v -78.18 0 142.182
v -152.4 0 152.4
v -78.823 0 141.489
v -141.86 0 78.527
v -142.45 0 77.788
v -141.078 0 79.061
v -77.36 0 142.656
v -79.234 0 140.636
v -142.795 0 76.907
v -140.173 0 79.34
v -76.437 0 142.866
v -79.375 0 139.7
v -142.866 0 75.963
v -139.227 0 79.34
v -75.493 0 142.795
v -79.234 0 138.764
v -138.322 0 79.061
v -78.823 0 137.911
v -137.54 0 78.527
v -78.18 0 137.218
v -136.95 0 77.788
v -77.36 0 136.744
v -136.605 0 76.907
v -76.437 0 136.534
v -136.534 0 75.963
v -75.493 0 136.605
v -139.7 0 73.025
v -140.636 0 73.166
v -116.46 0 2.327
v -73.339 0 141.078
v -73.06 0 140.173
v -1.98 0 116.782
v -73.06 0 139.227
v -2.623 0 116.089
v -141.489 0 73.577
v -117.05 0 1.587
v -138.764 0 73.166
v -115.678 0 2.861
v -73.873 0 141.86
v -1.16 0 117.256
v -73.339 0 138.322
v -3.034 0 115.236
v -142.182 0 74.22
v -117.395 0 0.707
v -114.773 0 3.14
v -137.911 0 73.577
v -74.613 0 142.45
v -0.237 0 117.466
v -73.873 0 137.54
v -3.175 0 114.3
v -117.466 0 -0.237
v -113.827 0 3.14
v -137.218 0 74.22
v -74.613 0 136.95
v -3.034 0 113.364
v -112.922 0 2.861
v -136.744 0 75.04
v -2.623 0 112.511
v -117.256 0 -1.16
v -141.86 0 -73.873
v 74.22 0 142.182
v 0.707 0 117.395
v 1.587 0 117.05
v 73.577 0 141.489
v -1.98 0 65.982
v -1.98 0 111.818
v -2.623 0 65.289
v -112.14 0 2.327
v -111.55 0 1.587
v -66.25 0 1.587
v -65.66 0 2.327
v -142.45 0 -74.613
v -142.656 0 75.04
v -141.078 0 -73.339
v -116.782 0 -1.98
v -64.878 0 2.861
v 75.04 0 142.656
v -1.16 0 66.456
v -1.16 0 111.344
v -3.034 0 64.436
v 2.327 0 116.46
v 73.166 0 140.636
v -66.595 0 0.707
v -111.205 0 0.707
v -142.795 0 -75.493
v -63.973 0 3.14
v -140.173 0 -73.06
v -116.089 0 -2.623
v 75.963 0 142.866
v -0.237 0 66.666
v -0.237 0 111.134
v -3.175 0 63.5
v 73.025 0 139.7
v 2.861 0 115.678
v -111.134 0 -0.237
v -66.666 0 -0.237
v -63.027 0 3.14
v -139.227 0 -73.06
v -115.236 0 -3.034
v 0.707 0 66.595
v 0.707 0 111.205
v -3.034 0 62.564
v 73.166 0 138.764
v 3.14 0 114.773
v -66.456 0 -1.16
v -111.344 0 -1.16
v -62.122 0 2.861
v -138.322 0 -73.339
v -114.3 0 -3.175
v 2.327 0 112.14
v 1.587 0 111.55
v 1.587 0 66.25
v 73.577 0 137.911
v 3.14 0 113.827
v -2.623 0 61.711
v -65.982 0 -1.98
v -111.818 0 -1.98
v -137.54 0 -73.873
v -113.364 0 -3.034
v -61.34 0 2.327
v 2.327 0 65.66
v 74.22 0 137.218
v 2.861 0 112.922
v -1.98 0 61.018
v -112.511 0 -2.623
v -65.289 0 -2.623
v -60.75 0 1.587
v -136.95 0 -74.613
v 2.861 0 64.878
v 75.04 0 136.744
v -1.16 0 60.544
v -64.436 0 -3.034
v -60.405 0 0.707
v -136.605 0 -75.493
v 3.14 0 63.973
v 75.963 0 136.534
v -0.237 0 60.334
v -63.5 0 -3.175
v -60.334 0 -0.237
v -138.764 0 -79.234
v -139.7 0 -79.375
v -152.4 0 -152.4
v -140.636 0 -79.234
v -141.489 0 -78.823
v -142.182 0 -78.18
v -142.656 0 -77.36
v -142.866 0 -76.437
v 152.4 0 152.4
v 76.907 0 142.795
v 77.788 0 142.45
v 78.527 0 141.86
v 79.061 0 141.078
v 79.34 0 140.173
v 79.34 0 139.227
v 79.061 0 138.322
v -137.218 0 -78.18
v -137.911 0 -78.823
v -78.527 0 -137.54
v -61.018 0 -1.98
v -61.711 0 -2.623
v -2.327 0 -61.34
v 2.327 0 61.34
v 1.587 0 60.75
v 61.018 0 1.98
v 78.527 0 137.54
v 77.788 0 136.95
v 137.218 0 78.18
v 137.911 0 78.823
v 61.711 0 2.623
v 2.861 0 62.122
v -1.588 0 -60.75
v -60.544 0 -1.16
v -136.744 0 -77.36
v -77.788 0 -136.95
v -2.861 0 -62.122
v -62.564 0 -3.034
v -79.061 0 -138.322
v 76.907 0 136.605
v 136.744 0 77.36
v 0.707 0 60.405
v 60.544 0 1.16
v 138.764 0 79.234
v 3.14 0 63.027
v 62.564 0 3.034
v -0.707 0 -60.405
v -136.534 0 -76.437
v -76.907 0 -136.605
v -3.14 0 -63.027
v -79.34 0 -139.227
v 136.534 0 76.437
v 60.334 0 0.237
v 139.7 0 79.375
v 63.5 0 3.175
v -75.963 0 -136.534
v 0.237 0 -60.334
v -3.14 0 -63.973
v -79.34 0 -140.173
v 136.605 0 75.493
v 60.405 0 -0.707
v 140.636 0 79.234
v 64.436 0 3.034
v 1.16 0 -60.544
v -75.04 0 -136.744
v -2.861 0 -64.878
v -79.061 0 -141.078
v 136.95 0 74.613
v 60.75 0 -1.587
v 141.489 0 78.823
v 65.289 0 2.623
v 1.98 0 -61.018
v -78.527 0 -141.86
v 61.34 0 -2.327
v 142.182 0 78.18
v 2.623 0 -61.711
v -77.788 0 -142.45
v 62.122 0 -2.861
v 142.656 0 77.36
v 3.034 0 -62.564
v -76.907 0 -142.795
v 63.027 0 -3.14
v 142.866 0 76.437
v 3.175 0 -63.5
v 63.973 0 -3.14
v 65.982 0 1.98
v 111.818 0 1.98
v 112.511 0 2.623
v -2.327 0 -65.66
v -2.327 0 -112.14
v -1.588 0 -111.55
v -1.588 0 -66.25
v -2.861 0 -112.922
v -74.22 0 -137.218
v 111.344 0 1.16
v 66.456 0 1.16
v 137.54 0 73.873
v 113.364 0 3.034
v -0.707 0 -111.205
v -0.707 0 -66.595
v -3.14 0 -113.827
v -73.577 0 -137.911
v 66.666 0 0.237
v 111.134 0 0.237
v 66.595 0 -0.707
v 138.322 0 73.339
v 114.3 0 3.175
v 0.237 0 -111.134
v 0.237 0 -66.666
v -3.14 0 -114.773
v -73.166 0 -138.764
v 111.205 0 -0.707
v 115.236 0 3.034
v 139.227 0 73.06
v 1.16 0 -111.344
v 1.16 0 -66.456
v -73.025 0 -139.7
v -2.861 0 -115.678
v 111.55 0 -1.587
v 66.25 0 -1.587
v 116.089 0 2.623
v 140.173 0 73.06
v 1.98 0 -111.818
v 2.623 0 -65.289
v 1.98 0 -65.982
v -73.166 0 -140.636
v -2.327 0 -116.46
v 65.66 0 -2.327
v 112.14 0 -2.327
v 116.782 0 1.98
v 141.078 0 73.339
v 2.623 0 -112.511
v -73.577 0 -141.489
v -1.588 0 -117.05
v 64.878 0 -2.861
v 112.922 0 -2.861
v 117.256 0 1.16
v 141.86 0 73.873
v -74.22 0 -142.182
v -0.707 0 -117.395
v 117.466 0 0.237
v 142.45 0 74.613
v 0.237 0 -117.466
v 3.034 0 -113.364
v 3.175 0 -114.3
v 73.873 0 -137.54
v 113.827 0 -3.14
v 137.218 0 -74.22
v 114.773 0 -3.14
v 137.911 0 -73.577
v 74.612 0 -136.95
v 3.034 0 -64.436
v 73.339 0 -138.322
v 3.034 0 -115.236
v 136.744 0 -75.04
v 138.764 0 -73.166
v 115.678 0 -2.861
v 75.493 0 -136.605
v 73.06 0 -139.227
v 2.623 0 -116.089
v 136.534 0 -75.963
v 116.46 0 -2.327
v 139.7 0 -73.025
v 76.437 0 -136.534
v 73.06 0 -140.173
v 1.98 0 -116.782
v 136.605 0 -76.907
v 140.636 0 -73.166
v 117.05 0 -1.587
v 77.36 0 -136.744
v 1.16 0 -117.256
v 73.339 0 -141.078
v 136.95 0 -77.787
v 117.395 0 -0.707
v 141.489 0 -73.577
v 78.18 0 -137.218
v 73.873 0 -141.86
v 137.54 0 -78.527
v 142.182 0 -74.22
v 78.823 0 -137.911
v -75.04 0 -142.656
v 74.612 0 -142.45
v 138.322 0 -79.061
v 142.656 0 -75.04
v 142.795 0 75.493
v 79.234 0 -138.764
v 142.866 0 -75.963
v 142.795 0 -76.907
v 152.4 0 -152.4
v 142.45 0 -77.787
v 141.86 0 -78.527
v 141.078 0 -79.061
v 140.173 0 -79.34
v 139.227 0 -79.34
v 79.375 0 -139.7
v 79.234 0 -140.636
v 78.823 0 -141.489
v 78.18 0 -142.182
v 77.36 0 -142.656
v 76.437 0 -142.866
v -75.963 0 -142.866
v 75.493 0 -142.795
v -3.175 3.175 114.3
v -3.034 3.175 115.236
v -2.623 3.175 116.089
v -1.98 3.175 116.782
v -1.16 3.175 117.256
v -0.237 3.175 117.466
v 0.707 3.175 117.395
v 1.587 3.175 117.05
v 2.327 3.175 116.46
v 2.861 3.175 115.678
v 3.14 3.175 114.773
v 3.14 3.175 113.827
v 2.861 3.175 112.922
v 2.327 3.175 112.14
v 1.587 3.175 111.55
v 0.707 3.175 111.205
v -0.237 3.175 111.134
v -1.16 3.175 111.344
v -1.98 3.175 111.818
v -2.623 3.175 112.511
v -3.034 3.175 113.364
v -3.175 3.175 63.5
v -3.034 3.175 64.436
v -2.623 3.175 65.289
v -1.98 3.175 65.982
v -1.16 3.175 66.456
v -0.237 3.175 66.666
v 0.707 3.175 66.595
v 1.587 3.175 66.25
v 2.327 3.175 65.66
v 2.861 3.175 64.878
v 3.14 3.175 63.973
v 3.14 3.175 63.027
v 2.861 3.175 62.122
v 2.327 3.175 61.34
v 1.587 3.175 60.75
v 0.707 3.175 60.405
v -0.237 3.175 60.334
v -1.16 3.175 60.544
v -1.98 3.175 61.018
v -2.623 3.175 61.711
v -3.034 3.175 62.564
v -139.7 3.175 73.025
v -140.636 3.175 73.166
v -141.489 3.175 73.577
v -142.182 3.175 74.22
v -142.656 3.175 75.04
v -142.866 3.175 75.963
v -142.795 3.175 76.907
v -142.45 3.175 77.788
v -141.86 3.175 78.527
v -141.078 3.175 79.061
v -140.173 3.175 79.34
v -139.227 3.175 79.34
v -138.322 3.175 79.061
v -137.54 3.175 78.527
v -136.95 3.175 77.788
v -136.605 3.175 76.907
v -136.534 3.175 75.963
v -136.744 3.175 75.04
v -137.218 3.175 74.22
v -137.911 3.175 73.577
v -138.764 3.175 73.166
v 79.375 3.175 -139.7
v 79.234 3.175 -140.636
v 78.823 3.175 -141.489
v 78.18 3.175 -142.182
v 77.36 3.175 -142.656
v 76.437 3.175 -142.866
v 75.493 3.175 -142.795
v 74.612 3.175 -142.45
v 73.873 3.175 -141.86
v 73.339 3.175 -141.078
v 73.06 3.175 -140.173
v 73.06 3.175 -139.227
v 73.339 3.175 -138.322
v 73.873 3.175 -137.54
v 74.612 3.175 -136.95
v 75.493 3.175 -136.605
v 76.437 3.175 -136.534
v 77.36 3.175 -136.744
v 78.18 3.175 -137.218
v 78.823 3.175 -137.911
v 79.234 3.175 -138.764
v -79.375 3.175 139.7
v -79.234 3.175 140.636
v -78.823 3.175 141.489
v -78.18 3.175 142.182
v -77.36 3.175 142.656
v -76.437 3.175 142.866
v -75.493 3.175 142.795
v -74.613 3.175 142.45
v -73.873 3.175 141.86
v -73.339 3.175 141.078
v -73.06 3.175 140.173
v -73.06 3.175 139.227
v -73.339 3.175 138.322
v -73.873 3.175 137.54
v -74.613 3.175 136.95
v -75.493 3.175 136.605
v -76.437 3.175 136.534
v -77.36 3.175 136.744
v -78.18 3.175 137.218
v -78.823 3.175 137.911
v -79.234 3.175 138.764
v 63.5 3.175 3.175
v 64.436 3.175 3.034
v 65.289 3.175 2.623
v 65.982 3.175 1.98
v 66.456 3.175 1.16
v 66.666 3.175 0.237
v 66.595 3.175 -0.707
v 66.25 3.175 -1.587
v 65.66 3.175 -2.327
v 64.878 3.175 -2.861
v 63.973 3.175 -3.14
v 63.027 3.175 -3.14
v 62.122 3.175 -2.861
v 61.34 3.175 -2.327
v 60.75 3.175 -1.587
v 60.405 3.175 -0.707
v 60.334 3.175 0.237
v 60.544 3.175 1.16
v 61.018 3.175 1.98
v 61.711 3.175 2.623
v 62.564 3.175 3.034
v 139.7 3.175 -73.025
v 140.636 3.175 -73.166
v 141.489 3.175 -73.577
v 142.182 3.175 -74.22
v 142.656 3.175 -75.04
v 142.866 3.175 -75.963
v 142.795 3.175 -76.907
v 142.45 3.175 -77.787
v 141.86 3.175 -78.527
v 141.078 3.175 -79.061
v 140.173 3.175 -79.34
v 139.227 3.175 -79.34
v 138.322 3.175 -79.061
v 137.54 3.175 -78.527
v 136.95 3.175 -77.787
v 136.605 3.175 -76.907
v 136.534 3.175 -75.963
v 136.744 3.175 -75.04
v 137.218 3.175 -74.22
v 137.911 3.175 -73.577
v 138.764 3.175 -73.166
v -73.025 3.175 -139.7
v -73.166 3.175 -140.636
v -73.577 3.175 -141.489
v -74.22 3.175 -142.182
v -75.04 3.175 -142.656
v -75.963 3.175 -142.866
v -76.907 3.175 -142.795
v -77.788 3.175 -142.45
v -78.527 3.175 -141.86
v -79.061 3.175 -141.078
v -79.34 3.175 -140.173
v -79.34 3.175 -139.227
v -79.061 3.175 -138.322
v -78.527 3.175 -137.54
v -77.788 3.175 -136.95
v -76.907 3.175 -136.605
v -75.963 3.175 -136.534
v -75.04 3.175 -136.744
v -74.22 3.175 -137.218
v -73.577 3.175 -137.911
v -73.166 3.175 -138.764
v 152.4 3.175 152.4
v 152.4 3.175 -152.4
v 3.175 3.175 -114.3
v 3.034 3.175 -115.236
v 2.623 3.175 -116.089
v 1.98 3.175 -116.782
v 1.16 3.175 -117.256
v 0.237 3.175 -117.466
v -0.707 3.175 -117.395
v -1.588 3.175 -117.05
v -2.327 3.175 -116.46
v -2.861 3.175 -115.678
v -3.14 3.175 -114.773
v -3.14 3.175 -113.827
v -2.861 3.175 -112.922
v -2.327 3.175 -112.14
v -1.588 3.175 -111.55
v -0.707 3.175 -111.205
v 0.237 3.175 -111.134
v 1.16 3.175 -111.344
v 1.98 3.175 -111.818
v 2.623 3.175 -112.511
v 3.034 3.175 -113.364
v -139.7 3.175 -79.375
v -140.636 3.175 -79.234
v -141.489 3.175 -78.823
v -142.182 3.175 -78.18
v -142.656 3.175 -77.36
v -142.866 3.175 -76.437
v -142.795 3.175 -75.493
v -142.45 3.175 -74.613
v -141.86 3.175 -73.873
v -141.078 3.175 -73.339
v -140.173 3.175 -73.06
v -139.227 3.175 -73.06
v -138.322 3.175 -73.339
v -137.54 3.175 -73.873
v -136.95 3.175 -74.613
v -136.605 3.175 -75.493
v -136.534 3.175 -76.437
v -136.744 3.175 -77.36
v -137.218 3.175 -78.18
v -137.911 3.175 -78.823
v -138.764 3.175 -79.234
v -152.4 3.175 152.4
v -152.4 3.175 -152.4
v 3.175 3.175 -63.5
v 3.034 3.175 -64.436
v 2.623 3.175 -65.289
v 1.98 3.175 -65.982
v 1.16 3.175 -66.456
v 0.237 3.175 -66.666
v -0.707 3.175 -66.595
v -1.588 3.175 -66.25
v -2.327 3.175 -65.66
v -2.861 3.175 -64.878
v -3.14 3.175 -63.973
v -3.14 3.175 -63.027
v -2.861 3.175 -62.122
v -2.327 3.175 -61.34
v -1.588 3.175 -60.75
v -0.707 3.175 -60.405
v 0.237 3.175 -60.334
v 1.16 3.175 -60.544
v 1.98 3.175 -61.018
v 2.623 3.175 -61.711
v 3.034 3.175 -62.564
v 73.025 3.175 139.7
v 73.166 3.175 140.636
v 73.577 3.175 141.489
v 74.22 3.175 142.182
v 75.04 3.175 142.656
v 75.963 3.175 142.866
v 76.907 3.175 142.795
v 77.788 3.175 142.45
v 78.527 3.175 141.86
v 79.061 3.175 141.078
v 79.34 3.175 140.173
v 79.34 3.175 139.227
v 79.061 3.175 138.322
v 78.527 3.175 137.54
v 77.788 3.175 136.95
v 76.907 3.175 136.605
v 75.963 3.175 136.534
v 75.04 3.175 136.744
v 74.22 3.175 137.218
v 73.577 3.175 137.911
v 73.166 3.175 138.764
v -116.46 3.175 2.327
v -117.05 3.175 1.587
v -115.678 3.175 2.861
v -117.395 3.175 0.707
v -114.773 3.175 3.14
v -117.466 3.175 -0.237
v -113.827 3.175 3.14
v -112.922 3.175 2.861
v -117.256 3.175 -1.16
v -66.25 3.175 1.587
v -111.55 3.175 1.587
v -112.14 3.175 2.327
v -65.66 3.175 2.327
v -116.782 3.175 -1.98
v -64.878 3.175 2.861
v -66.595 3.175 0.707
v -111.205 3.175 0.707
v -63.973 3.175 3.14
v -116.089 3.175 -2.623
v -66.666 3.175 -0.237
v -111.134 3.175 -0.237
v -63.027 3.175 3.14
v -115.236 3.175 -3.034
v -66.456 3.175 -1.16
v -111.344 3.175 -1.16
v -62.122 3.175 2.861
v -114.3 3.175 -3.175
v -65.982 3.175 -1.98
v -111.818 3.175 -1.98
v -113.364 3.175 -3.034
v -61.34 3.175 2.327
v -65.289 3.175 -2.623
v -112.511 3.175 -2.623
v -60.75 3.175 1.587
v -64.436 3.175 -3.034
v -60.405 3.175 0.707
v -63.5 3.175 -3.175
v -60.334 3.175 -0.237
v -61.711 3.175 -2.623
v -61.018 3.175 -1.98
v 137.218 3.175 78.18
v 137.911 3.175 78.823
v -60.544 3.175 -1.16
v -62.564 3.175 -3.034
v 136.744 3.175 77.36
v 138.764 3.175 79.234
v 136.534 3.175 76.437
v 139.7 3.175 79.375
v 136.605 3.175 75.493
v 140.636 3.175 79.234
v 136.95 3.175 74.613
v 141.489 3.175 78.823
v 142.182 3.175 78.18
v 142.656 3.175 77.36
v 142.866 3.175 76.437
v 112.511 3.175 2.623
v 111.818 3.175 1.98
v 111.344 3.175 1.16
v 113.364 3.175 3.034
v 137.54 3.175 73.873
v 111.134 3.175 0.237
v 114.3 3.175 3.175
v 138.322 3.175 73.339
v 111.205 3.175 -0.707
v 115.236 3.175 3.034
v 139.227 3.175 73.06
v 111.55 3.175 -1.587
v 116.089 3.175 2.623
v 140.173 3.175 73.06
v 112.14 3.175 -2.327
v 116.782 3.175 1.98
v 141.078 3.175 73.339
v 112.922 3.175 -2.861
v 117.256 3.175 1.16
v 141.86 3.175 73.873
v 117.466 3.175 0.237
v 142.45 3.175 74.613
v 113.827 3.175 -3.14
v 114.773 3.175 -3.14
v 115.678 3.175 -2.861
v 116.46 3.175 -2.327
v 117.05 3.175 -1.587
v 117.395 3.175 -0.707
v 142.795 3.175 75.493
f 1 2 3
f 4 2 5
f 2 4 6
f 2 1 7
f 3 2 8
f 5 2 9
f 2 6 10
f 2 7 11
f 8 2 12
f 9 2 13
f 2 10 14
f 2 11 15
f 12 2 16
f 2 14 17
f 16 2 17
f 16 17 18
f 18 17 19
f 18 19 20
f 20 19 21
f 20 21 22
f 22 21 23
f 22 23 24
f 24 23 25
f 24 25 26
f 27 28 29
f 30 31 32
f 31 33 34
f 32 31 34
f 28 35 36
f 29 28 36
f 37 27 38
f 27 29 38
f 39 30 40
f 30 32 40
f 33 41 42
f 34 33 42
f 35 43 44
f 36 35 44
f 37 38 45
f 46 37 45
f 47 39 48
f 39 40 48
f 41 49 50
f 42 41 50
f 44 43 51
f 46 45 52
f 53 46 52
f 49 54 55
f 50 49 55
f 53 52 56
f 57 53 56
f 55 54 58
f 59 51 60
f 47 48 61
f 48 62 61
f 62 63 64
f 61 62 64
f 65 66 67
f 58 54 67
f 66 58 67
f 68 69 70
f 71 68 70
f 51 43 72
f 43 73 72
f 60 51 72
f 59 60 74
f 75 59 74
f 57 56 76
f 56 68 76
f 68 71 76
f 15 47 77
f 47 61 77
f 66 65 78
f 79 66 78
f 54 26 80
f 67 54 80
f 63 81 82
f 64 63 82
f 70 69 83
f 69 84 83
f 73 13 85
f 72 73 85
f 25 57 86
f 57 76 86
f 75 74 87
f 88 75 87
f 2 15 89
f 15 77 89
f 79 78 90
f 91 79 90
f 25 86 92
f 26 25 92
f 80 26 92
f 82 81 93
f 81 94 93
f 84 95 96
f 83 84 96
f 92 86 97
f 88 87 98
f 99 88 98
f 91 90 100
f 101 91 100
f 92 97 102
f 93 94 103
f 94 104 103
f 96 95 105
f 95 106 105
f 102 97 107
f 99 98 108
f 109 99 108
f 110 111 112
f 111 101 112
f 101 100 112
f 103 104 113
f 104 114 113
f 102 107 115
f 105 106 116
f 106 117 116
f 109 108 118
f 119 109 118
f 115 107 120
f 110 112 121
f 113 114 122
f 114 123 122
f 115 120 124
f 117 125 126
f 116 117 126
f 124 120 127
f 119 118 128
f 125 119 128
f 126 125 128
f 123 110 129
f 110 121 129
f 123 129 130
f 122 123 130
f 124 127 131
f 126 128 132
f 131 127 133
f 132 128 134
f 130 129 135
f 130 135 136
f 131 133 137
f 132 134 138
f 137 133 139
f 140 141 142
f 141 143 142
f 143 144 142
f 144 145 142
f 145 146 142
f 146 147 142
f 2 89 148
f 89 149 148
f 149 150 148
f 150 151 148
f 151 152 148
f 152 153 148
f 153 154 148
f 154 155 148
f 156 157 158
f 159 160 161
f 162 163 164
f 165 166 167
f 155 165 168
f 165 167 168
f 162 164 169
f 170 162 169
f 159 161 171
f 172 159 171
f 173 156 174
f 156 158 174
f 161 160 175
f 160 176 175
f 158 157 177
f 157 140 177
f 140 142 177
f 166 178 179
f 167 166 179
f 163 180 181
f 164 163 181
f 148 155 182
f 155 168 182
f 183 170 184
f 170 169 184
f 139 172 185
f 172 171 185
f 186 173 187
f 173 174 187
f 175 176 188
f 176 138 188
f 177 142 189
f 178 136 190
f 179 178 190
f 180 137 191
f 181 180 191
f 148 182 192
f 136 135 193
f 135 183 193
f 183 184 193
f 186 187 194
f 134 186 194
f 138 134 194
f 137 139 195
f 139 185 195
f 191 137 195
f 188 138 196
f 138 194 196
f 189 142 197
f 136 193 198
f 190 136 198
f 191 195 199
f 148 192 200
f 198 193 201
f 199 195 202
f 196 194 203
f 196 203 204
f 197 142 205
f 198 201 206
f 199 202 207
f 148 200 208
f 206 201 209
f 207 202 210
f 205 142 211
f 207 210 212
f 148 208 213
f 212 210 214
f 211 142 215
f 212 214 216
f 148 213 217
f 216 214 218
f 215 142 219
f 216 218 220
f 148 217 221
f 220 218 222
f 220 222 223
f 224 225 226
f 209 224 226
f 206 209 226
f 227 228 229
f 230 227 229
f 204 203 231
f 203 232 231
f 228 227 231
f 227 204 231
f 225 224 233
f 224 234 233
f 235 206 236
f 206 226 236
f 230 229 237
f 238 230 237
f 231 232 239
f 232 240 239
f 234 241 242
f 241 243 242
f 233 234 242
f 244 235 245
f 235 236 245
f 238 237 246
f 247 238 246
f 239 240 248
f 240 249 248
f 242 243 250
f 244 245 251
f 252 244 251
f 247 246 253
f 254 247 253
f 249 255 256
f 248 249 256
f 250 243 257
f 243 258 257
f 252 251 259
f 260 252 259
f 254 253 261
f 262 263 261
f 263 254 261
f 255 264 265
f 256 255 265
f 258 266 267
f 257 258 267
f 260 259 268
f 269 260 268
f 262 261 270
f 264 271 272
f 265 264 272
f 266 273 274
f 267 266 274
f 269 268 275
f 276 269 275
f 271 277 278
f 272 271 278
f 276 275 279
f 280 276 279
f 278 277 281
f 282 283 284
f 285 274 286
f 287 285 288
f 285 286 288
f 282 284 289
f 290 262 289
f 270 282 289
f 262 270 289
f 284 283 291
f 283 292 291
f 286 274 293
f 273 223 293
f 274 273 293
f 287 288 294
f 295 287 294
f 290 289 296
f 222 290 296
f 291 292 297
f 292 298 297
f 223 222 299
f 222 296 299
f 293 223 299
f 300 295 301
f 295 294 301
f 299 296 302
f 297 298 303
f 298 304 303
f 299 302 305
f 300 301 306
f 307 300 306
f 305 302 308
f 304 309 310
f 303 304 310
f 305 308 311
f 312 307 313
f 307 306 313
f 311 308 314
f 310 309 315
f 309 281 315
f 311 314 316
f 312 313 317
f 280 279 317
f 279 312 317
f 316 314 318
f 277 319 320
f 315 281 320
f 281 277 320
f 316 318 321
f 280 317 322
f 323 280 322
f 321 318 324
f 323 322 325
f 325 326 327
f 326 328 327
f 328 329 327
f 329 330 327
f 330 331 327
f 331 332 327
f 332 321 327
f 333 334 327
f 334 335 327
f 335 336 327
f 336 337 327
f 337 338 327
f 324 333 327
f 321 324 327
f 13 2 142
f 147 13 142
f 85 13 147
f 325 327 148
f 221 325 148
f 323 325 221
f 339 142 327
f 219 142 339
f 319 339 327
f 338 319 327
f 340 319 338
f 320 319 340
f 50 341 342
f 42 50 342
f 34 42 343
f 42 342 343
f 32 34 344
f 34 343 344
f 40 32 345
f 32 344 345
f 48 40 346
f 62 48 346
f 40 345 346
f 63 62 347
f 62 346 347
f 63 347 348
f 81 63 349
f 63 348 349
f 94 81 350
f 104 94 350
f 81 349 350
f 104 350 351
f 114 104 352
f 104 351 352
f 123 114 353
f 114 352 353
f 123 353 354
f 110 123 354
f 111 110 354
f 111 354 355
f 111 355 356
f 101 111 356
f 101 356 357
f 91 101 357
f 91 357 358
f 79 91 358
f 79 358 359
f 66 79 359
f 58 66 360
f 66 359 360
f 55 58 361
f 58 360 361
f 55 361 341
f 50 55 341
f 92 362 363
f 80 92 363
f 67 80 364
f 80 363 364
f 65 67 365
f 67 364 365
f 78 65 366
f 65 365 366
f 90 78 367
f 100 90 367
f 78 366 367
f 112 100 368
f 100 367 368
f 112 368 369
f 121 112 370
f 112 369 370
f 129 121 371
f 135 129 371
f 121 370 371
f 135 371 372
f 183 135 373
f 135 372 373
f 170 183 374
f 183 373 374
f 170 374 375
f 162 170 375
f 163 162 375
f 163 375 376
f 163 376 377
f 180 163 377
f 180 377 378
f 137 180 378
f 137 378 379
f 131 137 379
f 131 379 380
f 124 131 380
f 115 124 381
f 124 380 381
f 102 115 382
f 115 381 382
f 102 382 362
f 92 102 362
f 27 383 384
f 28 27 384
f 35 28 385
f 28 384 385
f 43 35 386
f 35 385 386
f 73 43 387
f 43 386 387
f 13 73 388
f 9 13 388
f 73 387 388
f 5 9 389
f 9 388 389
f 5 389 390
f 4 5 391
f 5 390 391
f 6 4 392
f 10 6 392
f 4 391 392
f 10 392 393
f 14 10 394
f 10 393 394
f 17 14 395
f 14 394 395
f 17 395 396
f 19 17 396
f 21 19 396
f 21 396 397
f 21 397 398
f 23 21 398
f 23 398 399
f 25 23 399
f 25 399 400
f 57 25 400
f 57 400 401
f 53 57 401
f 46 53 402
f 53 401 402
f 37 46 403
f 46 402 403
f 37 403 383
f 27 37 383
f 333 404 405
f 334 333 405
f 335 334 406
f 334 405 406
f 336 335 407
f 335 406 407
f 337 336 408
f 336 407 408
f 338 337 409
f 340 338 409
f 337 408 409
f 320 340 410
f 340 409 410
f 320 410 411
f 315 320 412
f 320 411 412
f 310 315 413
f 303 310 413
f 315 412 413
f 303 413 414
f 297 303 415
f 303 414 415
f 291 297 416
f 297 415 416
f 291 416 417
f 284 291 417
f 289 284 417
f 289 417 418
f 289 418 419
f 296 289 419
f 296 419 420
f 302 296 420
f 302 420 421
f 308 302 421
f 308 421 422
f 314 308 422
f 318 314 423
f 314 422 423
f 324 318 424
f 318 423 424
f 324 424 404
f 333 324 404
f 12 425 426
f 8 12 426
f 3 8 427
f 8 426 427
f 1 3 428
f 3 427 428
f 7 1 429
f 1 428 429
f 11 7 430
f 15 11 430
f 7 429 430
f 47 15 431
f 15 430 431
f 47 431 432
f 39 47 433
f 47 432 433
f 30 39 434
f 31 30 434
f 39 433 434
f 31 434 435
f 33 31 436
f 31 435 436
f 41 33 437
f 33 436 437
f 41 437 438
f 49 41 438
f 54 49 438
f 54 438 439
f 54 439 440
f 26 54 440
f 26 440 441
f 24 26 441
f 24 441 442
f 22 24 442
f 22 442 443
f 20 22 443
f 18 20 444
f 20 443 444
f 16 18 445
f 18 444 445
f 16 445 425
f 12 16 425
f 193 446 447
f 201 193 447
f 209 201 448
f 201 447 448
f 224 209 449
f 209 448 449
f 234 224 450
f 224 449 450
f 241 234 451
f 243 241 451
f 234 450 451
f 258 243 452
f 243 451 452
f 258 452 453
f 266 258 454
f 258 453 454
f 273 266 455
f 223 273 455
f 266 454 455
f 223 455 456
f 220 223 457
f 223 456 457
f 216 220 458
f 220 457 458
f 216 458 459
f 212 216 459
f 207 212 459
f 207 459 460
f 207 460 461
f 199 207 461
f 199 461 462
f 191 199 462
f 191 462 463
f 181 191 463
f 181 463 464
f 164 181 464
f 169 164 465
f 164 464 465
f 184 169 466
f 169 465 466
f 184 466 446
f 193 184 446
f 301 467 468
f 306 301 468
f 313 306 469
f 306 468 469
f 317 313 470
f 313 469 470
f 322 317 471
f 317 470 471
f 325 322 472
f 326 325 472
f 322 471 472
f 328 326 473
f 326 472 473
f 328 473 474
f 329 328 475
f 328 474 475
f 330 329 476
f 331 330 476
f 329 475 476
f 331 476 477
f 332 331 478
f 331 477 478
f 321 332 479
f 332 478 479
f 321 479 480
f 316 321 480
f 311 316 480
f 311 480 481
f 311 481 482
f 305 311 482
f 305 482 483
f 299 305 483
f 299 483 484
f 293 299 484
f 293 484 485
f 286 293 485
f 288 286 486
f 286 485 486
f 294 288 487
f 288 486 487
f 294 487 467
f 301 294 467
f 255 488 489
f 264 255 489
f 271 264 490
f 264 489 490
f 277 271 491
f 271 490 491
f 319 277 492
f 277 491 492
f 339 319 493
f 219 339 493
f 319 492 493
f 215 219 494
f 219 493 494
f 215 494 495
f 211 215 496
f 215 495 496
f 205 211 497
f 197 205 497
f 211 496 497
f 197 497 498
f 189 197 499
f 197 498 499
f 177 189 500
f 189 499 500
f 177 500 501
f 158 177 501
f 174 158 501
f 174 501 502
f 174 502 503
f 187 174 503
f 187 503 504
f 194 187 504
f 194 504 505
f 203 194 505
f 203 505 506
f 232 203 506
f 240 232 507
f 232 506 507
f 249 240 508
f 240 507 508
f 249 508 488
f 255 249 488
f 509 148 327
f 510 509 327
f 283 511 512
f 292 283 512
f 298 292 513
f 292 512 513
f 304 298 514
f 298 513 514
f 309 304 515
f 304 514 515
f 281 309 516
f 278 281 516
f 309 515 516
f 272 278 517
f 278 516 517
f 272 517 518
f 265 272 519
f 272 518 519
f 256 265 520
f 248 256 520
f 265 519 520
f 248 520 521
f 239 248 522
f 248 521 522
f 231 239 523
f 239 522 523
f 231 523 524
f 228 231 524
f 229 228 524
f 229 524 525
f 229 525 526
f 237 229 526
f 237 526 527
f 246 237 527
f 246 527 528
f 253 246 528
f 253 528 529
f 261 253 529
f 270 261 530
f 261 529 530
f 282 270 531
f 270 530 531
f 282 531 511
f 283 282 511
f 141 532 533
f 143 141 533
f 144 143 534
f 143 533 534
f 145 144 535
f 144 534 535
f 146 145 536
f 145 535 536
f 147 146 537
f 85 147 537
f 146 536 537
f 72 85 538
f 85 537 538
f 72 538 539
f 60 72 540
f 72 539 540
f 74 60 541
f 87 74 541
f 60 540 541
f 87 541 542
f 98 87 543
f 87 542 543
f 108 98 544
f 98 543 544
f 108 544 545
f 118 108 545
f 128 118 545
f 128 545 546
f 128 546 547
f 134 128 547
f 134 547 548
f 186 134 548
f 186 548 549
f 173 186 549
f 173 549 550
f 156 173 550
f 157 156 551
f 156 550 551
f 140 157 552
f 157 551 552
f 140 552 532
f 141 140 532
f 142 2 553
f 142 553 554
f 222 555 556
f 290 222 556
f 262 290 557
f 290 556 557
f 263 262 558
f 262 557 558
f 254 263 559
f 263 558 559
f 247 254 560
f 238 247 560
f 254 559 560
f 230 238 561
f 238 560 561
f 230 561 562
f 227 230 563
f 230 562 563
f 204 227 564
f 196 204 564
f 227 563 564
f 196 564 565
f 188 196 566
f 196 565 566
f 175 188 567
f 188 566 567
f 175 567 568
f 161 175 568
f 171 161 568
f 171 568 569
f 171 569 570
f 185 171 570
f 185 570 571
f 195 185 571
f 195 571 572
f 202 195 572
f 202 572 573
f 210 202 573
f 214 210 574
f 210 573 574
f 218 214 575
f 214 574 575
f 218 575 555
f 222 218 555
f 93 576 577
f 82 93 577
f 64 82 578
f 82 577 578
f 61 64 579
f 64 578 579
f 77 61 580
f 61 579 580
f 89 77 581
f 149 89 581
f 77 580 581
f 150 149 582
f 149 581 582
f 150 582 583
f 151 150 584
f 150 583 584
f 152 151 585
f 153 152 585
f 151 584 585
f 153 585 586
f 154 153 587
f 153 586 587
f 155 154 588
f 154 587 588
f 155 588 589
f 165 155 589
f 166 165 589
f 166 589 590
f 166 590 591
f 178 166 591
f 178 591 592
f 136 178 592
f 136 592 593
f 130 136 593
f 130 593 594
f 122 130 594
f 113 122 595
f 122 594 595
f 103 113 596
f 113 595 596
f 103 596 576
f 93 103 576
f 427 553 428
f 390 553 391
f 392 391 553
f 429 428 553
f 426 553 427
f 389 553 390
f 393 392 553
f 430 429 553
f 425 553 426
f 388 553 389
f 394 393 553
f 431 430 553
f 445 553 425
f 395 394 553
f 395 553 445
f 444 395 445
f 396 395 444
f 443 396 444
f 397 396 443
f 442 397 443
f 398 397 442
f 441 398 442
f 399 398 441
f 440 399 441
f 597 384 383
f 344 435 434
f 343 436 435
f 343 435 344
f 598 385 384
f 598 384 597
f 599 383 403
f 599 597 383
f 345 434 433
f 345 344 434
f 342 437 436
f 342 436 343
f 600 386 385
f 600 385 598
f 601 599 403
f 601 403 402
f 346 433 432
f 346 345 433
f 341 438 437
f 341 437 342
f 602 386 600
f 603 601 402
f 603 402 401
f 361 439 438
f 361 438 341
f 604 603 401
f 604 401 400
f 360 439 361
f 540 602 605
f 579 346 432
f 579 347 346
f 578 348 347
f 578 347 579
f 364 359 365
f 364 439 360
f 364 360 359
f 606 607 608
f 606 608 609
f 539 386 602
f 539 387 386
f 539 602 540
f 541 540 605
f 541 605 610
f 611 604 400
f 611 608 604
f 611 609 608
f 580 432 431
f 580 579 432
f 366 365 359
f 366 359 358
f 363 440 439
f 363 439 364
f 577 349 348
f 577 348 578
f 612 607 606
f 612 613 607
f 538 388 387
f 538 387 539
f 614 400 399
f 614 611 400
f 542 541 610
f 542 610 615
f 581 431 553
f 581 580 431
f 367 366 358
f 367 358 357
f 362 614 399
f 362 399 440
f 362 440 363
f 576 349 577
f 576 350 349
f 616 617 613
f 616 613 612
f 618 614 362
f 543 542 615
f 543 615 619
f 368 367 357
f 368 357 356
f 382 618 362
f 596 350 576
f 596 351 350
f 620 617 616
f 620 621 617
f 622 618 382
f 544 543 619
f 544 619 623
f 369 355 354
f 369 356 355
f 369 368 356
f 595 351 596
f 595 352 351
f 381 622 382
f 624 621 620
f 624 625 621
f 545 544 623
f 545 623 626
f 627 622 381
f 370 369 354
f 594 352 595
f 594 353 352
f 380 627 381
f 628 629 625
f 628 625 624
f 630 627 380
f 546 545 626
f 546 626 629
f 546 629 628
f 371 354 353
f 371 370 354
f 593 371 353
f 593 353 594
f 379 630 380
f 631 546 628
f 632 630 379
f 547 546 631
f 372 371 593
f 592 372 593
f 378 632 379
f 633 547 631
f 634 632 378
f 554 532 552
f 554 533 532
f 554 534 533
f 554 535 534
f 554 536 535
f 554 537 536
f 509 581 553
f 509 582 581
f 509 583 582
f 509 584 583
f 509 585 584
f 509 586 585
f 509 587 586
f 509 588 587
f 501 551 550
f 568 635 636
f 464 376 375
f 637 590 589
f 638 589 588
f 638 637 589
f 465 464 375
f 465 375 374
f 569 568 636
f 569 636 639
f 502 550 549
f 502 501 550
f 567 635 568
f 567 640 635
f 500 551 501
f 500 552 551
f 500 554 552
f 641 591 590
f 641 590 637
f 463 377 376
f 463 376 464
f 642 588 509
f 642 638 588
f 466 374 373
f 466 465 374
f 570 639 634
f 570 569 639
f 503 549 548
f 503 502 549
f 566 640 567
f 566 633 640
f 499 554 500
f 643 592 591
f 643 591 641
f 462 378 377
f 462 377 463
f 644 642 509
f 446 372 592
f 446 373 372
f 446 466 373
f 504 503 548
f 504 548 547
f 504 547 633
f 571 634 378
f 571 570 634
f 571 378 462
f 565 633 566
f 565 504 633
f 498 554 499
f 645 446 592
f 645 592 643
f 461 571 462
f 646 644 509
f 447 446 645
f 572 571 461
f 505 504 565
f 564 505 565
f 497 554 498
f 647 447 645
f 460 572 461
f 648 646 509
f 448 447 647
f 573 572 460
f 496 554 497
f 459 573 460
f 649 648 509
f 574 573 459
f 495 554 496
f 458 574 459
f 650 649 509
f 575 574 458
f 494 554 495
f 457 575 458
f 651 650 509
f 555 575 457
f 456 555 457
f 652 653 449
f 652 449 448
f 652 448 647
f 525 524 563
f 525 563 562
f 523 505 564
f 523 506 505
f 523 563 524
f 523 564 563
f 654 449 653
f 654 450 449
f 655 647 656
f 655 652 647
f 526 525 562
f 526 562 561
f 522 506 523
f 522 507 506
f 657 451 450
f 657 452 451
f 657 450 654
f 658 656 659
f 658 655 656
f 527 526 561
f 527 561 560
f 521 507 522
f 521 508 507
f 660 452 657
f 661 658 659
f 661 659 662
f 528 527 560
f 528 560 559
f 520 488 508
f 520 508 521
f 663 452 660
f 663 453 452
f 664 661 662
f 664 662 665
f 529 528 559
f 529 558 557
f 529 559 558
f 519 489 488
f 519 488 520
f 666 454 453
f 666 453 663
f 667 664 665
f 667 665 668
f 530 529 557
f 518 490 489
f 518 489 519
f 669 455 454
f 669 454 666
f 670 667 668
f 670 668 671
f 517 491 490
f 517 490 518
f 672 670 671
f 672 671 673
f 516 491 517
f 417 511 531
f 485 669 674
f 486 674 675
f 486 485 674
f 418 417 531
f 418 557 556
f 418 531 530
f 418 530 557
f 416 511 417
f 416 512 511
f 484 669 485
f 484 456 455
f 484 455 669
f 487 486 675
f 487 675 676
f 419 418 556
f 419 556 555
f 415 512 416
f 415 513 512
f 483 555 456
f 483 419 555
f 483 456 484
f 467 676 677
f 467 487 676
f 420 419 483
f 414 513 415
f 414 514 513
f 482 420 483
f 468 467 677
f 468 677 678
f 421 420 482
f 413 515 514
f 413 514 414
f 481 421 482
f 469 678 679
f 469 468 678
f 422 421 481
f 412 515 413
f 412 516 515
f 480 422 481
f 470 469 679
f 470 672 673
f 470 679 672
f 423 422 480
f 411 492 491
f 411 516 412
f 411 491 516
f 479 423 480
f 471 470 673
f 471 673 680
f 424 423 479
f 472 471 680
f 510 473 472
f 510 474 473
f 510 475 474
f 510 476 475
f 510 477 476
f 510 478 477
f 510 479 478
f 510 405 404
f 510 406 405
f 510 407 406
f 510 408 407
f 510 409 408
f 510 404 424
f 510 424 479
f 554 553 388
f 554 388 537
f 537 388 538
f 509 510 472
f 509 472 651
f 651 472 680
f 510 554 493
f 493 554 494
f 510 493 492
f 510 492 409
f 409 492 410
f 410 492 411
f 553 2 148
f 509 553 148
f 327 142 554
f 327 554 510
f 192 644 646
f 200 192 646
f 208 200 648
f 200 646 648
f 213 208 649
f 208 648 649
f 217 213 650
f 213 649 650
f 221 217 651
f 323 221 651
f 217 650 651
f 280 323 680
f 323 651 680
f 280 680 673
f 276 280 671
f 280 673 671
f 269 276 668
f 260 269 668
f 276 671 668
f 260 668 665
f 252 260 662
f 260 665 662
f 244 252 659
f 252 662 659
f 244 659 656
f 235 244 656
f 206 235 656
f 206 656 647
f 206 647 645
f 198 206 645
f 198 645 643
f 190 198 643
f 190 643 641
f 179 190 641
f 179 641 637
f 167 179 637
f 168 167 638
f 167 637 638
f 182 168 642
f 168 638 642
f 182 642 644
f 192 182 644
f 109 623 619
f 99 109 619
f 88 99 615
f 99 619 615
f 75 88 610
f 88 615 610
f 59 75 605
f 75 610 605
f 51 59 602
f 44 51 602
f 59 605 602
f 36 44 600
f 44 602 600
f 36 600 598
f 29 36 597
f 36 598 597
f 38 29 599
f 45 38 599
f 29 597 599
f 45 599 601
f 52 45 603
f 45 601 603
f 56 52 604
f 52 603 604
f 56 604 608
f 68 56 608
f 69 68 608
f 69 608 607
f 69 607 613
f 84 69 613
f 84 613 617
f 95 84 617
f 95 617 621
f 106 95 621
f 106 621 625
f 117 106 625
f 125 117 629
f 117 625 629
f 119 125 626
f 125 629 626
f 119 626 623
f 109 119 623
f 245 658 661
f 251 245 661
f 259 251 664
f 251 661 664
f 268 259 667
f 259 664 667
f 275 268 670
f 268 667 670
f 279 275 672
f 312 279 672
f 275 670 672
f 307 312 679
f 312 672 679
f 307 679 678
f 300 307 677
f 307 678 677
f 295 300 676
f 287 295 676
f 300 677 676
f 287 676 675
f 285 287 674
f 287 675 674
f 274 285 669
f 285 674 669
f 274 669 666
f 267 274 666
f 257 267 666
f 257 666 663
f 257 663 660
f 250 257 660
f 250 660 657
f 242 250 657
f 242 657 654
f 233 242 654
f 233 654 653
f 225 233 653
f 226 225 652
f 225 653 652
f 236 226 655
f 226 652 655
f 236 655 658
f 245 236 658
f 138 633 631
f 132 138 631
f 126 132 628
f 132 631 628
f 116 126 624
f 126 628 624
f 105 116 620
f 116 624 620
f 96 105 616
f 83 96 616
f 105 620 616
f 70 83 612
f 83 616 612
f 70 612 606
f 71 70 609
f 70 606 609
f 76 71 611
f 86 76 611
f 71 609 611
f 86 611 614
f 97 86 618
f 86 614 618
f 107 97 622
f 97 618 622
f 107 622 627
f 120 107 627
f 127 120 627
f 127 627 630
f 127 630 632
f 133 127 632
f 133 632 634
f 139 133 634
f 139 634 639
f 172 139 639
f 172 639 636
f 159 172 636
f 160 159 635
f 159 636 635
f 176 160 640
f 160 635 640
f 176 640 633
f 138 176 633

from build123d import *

# Parameters (mm, degrees)
SKETCH1_W           = 304.8
SKETCH1_H           = 304.8
BOSS_EXTRUDE1_DEPTH = 3.175
CUT_EXTRUDE1_REACH  = 217.55
SKETCH2_R           = 3.175
CIRPATTERN1_COUNT   = 4
CUT_EXTRUDE2_REACH  = 217.55
SKETCH4_R           = 3.175
CIRPATTERN2_COUNT   = 4


with BuildPart() as part:
    # Sketch1 → Boss-Extrude1 (new body)
    with BuildSketch(Plane(origin=(0, 0, 0), x_dir=(1, 0, 0), z_dir=(0, 1, 0))):
        Rectangle(SKETCH1_W, SKETCH1_H)
    extrude(amount=BOSS_EXTRUDE1_DEPTH)

    # Sketch2 → Cut-Extrude1 (cut, up to next)
    with BuildSketch(Plane(origin=(0, 3.175, 0), x_dir=(1, 0, 0), z_dir=(0, 1, 0)), mode=Mode.PRIVATE) as cut_extrude1_sk1:
        with Locations((0, 114.3)):
            Circle(SKETCH2_R)
    cut_extrude1_tool1 = extrude(cut_extrude1_sk1.sketch, amount=-CUT_EXTRUDE1_REACH, mode=Mode.PRIVATE) & part.part
    # Sketch2 → Cut-Extrude1 (cut, up to next)
    with BuildSketch(Plane(origin=(0, 3.175, 0), x_dir=(1, 0, 0), z_dir=(0, 1, 0)), mode=Mode.PRIVATE) as cut_extrude1_sk2:
        with Locations((0, 63.5)):
            Circle(SKETCH2_R)
    cut_extrude1_tool2 = extrude(cut_extrude1_sk2.sketch, amount=-CUT_EXTRUDE1_REACH, mode=Mode.PRIVATE) & part.part
    cut_extrude1_1 = cut_extrude1_tool1.solids().sort_by_distance((0, 3.175, -114.3))[0]
    add(cut_extrude1_1, mode=Mode.SUBTRACT)
    cut_extrude1_2 = cut_extrude1_tool2.solids().sort_by_distance((0, 3.175, -63.5))[0]
    add(cut_extrude1_2, mode=Mode.SUBTRACT)
    cut_extrude1 = cut_extrude1_1 + cut_extrude1_2  # Cut-Extrude1 as one shape, for the pattern or mirror that repeats it

    # CirPattern1: Cut-Extrude1 ×4 about axis
    cirpattern1_axis = Axis((0, 3.175, 0), (0, 1, 0))
    for i in range(1, CIRPATTERN1_COUNT):
        add(cut_extrude1.rotate(cirpattern1_axis, i * 360 / CIRPATTERN1_COUNT), mode=Mode.SUBTRACT)

    # Sketch4 → Cut-Extrude2 (cut, up to next)
    with BuildSketch(Plane(origin=(0, 3.175, 0), x_dir=(1, 0, 0), z_dir=(0, 1, 0)), mode=Mode.PRIVATE) as cut_extrude2_sk1:
        with Locations((-76.2, 139.7)):
            Circle(SKETCH4_R)
    cut_extrude2_tool1 = extrude(cut_extrude2_sk1.sketch, amount=-CUT_EXTRUDE2_REACH, mode=Mode.PRIVATE) & part.part
    # Sketch4 → Cut-Extrude2 (cut, up to next)
    with BuildSketch(Plane(origin=(0, 3.175, 0), x_dir=(1, 0, 0), z_dir=(0, 1, 0)), mode=Mode.PRIVATE) as cut_extrude2_sk2:
        with Locations((76.2, 139.7)):
            Circle(SKETCH4_R)
    cut_extrude2_tool2 = extrude(cut_extrude2_sk2.sketch, amount=-CUT_EXTRUDE2_REACH, mode=Mode.PRIVATE) & part.part
    cut_extrude2_1 = cut_extrude2_tool1.solids().sort_by_distance((-76.2, 3.175, -139.7))[0]
    add(cut_extrude2_1, mode=Mode.SUBTRACT)
    cut_extrude2_2 = cut_extrude2_tool2.solids().sort_by_distance((76.2, 3.175, -139.7))[0]
    add(cut_extrude2_2, mode=Mode.SUBTRACT)
    cut_extrude2 = cut_extrude2_1 + cut_extrude2_2  # Cut-Extrude2 as one shape, for the pattern or mirror that repeats it

    # CirPattern2: Cut-Extrude2 ×4 about axis
    cirpattern2_axis = Axis((0, 3.175, 0), (0, 1, 0))
    for i in range(1, CIRPATTERN2_COUNT):
        add(cut_extrude2.rotate(cirpattern2_axis, i * 360 / CIRPATTERN2_COUNT), mode=Mode.SUBTRACT)


solid = part.part
